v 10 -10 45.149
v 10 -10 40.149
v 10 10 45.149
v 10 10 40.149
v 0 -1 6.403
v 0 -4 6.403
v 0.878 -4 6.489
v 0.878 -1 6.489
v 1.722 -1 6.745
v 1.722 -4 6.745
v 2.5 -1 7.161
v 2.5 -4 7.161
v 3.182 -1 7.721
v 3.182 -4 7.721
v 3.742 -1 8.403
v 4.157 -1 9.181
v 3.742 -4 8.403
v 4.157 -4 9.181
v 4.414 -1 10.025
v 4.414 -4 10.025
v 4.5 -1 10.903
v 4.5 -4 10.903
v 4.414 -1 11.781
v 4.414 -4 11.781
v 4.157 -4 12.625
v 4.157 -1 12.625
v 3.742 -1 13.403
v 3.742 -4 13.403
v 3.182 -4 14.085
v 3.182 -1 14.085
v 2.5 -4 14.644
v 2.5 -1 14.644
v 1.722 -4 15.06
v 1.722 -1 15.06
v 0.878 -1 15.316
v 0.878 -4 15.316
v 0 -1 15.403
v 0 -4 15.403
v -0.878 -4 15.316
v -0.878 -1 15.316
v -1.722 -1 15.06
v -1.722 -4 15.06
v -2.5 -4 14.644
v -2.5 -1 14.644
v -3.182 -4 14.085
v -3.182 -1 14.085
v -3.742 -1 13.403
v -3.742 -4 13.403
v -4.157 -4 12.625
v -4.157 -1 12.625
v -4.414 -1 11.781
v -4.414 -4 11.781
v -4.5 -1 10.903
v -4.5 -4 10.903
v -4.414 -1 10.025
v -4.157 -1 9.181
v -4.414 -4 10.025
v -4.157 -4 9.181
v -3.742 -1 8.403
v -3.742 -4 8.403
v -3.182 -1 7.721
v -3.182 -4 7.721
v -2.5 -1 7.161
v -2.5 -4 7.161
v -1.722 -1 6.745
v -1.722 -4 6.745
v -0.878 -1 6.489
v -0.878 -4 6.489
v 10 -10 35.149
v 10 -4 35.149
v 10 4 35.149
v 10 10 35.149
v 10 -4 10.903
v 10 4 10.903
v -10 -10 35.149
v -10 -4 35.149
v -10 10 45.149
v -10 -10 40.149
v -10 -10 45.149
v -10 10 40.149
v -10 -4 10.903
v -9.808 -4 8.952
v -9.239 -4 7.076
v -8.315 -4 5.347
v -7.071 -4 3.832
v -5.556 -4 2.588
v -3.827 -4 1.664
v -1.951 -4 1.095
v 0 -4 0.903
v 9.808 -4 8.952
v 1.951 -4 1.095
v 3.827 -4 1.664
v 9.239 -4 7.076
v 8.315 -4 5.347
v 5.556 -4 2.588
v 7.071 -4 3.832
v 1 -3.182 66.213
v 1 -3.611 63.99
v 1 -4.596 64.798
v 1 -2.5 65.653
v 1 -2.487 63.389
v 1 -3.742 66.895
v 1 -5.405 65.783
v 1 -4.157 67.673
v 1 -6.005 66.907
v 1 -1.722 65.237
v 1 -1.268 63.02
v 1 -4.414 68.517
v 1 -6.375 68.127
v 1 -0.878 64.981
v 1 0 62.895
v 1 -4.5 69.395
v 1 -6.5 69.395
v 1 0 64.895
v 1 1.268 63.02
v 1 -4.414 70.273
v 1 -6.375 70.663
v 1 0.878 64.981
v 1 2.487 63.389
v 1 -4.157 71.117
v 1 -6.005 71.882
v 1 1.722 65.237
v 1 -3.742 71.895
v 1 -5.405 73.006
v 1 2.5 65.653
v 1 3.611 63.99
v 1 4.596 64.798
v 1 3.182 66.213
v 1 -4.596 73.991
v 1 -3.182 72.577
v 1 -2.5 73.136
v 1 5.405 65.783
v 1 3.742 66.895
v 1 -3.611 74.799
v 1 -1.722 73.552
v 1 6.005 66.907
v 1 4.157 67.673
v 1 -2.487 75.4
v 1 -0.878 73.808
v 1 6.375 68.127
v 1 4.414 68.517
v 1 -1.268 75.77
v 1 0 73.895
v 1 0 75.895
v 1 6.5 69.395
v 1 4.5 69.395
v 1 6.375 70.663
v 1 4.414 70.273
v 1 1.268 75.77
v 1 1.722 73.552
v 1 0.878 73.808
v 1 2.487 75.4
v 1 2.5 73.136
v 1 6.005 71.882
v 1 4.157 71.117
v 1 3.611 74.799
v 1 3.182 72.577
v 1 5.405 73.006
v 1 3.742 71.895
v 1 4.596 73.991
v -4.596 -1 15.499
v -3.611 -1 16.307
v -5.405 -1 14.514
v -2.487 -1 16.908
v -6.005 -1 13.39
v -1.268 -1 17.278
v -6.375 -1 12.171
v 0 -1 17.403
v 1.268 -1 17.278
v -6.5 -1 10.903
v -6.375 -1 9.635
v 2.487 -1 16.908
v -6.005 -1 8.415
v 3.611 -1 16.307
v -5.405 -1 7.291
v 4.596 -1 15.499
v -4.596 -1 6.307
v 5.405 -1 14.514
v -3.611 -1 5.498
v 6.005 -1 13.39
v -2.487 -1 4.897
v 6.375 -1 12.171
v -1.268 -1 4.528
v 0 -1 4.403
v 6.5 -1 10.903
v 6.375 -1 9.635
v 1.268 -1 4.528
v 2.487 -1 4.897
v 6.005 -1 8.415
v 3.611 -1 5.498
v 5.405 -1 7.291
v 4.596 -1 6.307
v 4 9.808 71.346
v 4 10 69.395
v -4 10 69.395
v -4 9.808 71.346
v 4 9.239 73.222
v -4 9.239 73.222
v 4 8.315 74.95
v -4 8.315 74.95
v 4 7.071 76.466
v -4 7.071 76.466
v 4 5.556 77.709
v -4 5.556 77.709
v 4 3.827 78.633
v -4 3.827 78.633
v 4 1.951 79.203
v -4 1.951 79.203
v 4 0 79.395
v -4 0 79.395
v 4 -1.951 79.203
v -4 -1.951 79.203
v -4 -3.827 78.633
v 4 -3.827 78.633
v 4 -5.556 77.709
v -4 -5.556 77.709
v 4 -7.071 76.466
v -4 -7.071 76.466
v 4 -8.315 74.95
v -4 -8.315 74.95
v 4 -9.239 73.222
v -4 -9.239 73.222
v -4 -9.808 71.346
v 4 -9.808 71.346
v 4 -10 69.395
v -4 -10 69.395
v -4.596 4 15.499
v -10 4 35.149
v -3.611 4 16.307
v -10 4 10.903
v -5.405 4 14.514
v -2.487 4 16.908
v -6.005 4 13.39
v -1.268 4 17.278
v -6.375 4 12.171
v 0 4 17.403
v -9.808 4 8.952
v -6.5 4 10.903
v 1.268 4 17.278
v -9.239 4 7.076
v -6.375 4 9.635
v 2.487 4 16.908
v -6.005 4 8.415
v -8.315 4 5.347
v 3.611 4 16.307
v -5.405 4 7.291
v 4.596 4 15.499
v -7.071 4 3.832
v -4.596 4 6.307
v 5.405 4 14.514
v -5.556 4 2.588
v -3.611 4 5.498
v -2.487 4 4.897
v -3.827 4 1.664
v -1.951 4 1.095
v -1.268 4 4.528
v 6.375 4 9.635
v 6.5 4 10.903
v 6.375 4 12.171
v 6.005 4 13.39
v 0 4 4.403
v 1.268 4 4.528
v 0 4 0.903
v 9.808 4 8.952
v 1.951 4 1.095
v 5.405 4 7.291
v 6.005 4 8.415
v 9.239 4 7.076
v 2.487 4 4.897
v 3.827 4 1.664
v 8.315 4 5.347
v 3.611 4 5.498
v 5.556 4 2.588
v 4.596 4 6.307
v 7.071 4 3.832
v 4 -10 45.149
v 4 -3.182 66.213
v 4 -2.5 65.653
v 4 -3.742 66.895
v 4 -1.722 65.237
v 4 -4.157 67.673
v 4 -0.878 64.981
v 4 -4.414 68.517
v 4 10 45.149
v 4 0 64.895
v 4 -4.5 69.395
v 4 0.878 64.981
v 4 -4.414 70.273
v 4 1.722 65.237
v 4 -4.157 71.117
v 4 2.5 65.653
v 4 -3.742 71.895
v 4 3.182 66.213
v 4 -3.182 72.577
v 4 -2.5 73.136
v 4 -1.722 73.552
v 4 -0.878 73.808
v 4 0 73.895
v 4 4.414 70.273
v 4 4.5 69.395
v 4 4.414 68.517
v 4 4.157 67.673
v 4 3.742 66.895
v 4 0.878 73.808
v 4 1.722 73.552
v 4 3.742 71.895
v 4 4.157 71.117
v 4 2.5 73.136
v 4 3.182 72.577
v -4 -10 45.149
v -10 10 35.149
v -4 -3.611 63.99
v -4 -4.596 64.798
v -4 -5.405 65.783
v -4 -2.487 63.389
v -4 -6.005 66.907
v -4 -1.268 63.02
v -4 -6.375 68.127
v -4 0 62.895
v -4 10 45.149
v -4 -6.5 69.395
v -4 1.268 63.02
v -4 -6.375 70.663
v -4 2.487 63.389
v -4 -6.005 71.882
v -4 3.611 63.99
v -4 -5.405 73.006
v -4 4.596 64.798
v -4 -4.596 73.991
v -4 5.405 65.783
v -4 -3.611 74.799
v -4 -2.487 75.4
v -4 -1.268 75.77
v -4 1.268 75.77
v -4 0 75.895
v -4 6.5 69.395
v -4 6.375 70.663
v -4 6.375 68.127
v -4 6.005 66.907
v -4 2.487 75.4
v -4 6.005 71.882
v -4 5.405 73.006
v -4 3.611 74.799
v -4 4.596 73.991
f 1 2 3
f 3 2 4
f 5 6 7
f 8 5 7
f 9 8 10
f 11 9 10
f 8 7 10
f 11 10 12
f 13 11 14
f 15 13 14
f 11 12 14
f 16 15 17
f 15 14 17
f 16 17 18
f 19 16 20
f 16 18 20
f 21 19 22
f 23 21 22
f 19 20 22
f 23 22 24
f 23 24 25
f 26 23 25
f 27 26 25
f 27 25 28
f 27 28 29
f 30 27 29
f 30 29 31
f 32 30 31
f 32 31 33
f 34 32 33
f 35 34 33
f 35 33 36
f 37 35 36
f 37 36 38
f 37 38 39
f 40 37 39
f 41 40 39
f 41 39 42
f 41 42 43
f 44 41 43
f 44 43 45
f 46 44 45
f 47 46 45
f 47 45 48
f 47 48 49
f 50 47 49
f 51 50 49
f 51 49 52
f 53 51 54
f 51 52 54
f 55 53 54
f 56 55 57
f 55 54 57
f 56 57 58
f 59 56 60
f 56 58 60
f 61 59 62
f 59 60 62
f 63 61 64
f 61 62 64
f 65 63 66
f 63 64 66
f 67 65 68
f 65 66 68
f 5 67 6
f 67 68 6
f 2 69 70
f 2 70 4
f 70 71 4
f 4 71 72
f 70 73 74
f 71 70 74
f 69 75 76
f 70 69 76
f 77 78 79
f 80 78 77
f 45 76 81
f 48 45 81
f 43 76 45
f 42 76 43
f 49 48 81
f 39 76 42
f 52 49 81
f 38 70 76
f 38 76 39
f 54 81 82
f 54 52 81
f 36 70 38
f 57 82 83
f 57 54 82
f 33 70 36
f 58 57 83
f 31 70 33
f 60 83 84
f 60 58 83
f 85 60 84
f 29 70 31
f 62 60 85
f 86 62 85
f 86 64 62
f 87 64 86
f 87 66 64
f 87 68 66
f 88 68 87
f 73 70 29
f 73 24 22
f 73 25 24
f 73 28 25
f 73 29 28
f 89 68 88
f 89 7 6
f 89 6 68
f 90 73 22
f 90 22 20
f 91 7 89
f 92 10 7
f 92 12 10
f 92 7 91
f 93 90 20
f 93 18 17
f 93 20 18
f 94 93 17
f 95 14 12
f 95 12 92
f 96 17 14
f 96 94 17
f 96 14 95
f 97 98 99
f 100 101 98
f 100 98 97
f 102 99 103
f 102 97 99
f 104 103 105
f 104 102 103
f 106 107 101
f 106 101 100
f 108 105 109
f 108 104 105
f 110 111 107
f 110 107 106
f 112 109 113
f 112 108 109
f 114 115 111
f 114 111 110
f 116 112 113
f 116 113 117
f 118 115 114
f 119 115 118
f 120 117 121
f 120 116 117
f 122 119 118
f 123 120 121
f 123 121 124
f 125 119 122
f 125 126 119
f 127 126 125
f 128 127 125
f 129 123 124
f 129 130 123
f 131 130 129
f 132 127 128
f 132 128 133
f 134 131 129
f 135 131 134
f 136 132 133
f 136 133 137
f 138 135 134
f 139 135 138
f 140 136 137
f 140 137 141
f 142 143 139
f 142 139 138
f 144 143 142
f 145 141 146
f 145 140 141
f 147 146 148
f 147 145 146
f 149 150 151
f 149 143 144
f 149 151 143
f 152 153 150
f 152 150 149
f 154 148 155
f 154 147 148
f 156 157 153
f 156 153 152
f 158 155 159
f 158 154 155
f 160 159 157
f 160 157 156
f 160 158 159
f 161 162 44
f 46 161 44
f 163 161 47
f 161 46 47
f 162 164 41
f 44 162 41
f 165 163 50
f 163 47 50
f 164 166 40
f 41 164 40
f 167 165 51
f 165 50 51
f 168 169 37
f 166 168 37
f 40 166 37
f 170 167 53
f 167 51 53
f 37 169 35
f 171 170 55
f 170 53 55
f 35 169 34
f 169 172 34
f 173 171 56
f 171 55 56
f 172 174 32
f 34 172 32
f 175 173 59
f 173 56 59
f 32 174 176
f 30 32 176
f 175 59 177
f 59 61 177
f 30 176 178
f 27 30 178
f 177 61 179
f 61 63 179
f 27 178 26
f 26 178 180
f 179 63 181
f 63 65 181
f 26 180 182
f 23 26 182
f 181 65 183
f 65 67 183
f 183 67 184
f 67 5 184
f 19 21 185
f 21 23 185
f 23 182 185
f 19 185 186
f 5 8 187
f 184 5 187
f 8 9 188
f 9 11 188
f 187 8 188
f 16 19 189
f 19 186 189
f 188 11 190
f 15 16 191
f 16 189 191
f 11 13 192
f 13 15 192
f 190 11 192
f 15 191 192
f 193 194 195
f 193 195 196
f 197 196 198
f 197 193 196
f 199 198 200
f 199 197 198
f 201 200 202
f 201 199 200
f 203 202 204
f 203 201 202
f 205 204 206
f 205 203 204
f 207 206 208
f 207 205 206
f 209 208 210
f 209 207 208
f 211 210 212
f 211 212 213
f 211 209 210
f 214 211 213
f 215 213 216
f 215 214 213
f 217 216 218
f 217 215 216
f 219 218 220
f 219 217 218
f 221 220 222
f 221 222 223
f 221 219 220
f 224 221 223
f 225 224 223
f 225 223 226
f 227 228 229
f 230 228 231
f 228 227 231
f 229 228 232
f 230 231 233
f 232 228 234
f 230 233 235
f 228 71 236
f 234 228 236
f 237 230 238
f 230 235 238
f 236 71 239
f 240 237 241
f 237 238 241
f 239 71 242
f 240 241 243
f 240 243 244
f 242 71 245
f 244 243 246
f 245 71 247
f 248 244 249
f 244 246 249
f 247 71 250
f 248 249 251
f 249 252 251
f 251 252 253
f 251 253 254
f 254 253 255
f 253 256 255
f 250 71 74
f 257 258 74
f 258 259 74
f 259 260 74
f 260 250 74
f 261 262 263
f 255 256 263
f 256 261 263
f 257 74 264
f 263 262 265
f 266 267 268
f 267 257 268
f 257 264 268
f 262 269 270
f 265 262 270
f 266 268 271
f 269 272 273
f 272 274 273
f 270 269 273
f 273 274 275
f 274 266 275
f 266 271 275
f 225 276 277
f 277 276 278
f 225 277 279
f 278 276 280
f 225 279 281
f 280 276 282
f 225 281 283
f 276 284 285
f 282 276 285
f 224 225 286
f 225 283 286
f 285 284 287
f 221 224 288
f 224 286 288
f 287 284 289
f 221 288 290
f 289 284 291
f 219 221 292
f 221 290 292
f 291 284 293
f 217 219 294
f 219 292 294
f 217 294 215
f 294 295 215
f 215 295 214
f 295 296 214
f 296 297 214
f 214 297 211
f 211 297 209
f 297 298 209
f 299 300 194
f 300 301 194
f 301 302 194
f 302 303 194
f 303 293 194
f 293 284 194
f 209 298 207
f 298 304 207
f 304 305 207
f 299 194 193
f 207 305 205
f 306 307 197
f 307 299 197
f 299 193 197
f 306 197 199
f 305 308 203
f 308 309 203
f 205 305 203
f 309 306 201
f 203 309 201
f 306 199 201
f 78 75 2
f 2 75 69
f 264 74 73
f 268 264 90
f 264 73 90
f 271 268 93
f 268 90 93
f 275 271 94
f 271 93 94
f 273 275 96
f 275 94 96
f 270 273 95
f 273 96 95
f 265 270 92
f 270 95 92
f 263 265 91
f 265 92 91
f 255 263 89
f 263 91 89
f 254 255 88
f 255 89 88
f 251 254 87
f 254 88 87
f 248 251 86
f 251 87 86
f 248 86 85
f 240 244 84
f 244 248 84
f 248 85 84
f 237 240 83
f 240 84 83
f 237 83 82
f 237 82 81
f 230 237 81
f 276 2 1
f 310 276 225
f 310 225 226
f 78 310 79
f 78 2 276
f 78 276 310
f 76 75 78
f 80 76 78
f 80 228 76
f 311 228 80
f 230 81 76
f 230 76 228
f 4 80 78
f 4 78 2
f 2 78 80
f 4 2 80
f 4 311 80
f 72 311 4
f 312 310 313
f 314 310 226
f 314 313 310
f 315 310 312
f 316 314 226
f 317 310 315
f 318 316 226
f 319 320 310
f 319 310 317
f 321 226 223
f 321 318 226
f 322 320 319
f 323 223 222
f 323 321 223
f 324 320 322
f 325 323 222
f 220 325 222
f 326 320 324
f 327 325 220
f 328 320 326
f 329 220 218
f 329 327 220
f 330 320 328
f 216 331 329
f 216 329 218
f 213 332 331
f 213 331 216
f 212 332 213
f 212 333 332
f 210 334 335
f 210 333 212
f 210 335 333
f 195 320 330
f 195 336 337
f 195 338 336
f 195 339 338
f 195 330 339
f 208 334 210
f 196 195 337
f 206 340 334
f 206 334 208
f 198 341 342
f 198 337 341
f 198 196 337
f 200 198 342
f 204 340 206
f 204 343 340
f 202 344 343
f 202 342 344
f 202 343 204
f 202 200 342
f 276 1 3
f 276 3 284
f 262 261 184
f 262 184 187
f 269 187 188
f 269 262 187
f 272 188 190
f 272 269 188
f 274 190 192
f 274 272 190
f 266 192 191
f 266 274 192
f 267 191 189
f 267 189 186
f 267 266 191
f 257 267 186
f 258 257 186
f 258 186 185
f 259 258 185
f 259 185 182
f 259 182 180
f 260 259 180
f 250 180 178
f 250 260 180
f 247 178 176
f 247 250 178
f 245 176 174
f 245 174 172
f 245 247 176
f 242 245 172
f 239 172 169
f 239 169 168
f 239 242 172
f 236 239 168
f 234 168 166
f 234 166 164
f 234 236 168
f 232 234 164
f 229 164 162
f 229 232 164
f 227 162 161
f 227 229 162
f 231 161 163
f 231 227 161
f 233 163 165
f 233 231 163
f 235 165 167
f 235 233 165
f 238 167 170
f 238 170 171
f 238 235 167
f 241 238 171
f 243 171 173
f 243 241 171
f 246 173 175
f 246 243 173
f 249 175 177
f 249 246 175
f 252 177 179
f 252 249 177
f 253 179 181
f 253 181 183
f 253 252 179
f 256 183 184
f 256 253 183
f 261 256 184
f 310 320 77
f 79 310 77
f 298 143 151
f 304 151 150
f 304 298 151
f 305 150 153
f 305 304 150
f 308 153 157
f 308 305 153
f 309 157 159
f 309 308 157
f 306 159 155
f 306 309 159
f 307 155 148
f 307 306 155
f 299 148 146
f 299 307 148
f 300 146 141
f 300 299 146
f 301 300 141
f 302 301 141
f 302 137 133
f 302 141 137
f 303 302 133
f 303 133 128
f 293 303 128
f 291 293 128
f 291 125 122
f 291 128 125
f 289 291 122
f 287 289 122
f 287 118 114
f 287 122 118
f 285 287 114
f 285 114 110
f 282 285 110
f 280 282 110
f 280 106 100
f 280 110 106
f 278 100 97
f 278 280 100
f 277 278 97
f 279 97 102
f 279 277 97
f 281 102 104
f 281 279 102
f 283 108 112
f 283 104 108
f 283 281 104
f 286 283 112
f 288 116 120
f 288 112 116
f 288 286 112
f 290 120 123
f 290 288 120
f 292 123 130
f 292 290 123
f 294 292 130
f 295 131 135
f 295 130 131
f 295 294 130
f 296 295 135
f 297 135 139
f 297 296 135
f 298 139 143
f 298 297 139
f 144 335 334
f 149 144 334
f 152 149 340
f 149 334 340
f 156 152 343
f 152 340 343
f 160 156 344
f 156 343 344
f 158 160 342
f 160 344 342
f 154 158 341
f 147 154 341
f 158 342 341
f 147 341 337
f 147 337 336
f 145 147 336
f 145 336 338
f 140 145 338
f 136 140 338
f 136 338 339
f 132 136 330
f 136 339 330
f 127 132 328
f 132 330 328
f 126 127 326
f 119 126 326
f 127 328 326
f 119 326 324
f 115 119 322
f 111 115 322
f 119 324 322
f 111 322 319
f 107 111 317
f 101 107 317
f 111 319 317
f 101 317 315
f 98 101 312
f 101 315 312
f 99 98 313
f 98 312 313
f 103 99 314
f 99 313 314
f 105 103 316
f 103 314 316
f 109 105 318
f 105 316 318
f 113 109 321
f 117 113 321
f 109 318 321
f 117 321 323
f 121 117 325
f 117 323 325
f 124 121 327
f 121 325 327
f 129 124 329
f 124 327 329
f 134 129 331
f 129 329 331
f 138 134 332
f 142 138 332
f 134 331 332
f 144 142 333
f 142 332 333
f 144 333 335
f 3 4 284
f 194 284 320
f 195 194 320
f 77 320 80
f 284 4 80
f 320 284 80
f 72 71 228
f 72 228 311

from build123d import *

# Parameters (mm, degrees)
SKETCH_1_W          = 20
SKETCH_1_H          = 20
EXTRUDE_1_DEPTH     = 80.297387422
SKETCH_7_W          = 35.148693711
SKETCH_7_H          = 6
CUT_EXTRUDE_6_DEPTH = 34
SKETCH_2_R          = 6.5
CUT_EXTRUDE_9_DEPTH = 5
SKETCH_3_R          = 4.5
CUT_EXTRUDE_2_DEPTH = 29
MOVE_BODY_1_ANGLE   = 90


# Read off the part's stored shape, not the designer's step: 교차3
with BuildPart() as part:
    # 스케치1 → 보스-돌출1 (new body)
    with BuildSketch(Plane.XY):
        Rectangle(SKETCH_1_W, SKETCH_1_H)
    extrude(amount=EXTRUDE_1_DEPTH)

    # 스케치7 → 컷-돌출6 (cut)
    with BuildSketch(Plane(origin=(10, 0, 0), x_dir=(0, 0, -1), z_dir=(1, 0, 0))):
        with Locations((-17.574346855, 7)):
            Rectangle(SKETCH_7_W, SKETCH_7_H)
        with Locations((-17.574346855, -7)):
            Rectangle(SKETCH_7_W, SKETCH_7_H)
    cut_extrude_6 = extrude(amount=-CUT_EXTRUDE_6_DEPTH, mode=Mode.SUBTRACT)

    # 스케치2 → 컷-돌출9 (cut)
    with BuildSketch(Plane(origin=(0, 4, 0), x_dir=(-1, 0, 0), z_dir=(0, -1, 0))):
        with Locations(Location((0, -10.902706153, 0), (0, 0, 90))):
            Circle(SKETCH_2_R)
    cut_extrude_9 = extrude(amount=CUT_EXTRUDE_9_DEPTH, mode=Mode.SUBTRACT)

    # 스케치3 → 컷-돌출2 (cut)
    with BuildSketch(Plane(origin=(0, -4, 0), x_dir=(-1, 0, 0), z_dir=(0, -1, 0))):
        with Locations(Location((0, -10.902706153, 0), (0, 0, 90))):
            Circle(SKETCH_3_R)
        with BuildLine():
            Line((-21.262122506, -10.902706153), (-10, -10.902706153))
            ThreePointArc((-10, -10.902706153), (0, -0.902706153), (10, -10.902706153))
            Line((10, -10.902706153), (21.262122506, -10.902706153))
            ThreePointArc((21.262122506, -10.902706153), (0, 10.359416353), (-21.262122506, -10.902706153))
        make_face()
    cut_extrude_2 = extrude(amount=-CUT_EXTRUDE_2_DEPTH, mode=Mode.SUBTRACT)

    # 대칭 복사6: 컷-돌출6, 컷-돌출9, 컷-돌출2 across plane
    add(cut_extrude_6.mirror(Plane.XY.offset(40.148693711)), mode=Mode.SUBTRACT)
    add(cut_extrude_9.mirror(Plane.XY.offset(40.148693711)), mode=Mode.SUBTRACT)
    add(cut_extrude_2.mirror(Plane.XY.offset(40.148693711)), mode=Mode.SUBTRACT)


with BuildPart() as body_2:
    # 교차3: the piece on the far side of the plane
    add(part.part)
    split(bisect_by=Plane.XY.offset(40.148693711), keep=Keep.BOTTOM)


with BuildPart() as part_1:
    add(part.part)

    # 교차3
    split(bisect_by=Plane.XY.offset(40.148693711), keep=Keep.TOP)


with BuildPart() as part_2:
    # Move Body 1: moved
    add(part_1.part.rotate(Axis((0, 0, 0), (0, 0, 1)), MOVE_BODY_1_ANGLE))


solid = Compound([body_2.part, part_2.part])
